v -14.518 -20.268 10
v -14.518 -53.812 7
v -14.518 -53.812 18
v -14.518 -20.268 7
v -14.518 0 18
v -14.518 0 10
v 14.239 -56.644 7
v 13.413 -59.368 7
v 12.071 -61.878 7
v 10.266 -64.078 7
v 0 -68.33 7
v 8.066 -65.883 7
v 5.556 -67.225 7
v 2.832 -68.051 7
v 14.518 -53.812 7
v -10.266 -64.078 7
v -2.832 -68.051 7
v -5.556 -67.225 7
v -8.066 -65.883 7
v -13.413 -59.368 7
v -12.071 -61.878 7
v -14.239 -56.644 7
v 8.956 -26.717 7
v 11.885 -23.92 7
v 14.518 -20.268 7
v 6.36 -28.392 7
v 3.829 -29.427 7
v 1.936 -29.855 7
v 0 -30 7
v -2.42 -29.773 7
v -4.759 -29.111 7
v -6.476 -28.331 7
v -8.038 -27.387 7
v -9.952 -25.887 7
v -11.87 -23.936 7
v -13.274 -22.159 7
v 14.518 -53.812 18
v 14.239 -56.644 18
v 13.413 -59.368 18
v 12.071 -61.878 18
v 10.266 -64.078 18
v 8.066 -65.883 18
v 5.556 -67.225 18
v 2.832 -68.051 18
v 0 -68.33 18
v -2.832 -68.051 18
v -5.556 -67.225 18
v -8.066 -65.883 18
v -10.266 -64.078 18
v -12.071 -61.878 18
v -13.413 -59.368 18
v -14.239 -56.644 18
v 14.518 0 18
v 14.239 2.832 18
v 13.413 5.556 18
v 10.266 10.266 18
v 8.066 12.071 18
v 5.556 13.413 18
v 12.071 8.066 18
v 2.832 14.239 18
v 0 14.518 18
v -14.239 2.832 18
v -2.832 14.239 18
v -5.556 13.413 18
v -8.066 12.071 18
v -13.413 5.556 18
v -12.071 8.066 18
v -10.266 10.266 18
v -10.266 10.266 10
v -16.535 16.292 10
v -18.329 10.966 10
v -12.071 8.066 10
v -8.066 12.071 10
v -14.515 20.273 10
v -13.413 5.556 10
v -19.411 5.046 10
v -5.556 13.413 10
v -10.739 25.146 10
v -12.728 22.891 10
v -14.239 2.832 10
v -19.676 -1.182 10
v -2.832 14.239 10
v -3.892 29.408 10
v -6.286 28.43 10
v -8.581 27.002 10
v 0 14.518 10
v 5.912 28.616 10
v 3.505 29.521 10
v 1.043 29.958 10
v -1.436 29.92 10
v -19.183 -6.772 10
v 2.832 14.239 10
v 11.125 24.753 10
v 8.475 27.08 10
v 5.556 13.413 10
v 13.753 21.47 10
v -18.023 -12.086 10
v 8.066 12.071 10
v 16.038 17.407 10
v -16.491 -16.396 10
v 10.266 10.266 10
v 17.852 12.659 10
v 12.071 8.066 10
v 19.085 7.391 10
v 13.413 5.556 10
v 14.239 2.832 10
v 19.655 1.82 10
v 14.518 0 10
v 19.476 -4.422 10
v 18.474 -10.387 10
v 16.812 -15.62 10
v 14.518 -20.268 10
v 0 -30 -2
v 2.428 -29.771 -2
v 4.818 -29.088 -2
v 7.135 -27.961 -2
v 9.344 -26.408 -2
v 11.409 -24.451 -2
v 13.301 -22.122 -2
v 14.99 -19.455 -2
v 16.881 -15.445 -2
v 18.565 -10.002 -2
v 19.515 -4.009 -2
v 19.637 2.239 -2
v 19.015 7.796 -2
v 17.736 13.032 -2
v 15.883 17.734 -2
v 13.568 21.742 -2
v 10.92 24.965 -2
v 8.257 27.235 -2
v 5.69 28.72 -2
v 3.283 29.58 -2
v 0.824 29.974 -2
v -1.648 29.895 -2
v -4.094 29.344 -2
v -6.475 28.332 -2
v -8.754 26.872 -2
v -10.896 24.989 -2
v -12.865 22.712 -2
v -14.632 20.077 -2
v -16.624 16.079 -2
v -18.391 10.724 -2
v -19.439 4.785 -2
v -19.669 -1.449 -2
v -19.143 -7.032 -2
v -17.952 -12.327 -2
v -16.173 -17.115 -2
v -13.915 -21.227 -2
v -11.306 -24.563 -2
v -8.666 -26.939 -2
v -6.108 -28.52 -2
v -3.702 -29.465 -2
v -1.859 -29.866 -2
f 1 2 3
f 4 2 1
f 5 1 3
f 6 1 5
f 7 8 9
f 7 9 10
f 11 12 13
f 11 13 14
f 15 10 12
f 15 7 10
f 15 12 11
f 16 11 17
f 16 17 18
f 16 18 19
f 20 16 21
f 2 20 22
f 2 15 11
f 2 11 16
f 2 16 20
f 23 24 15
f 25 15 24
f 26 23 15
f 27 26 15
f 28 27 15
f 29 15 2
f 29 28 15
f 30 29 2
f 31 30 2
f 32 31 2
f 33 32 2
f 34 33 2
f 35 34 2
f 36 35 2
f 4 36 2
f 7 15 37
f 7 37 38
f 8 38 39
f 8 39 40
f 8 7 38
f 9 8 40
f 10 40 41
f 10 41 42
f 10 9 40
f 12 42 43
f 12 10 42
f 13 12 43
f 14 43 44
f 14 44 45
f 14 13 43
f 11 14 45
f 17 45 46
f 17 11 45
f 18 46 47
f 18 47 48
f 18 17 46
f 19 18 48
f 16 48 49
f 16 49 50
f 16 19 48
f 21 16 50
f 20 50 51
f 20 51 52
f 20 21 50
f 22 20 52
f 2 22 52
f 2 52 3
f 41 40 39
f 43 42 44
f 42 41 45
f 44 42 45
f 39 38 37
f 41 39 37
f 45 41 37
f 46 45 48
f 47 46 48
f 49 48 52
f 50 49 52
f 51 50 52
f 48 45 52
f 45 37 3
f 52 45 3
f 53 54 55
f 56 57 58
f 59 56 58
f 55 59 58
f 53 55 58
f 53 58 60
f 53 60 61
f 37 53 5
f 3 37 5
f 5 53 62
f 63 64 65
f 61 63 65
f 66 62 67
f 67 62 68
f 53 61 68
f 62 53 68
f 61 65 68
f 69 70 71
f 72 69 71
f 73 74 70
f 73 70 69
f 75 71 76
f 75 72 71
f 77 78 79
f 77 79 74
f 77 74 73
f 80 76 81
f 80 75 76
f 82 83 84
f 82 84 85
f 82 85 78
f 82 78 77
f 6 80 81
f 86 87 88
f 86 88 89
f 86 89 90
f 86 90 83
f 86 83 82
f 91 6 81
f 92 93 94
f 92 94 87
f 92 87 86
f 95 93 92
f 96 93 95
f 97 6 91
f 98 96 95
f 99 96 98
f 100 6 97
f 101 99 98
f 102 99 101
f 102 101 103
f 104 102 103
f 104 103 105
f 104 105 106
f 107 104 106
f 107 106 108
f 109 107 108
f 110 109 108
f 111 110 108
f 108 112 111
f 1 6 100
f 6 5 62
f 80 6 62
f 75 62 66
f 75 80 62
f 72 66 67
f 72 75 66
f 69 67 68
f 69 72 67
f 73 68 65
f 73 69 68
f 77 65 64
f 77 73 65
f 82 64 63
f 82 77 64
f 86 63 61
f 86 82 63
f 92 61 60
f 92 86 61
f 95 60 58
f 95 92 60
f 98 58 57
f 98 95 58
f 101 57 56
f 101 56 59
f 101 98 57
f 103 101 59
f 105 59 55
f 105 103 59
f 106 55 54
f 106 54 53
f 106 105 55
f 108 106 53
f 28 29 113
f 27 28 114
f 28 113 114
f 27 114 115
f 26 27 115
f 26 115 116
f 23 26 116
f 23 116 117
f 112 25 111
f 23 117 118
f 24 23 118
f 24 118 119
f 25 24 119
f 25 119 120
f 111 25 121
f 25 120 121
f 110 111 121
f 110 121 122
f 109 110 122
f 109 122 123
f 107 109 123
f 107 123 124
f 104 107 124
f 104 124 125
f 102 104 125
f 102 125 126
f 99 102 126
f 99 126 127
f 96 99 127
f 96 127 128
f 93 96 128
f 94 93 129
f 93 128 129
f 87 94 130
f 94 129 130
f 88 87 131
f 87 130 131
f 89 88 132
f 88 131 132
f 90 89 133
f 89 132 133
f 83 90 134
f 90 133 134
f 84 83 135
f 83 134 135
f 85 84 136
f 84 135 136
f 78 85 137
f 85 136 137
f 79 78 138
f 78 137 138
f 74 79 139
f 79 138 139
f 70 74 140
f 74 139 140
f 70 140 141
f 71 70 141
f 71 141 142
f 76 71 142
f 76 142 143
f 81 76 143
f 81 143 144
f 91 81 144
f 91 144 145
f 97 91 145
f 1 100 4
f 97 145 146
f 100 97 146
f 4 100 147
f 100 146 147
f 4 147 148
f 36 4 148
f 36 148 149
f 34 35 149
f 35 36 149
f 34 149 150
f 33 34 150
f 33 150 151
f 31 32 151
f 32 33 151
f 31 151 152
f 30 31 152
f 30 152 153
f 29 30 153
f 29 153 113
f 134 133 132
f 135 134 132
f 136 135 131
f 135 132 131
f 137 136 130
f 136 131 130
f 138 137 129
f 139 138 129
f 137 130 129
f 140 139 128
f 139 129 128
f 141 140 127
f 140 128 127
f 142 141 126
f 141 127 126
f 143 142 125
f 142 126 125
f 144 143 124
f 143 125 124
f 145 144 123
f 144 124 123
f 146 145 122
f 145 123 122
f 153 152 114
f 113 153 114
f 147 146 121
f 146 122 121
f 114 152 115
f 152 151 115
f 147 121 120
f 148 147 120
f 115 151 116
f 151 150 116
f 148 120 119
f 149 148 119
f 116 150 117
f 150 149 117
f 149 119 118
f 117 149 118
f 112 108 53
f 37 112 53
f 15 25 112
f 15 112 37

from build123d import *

# Parameters (mm, degrees)
EXTRUDE_1_DEPTH      = 10
EXTRUDE_1_DEPTH_BACK = 2
SKETCH_1_RX          = 30
SKETCH_1_RY          = 19.691511613
EXTRUDE_2_DEPTH      = 8
EXTRUDE_2_DEPTH_BACK = 3


with BuildPart() as part:
    # 草图1 → 凸台-拉伸1 (new, two sides: drawn at the far end of the back side and taken through both)
    with BuildSketch(Plane.XY.offset(-EXTRUDE_1_DEPTH_BACK)):
        with Locations(Location((0, 0), (0, 0, -90))):
            Ellipse(SKETCH_1_RX, SKETCH_1_RY)
    extrude(amount=EXTRUDE_1_DEPTH + EXTRUDE_1_DEPTH_BACK)

    # 草图2 → 凸台-拉伸2 (add, two sides: drawn at the far end of the back side and taken through both)
    with BuildSketch(Plane.XY.offset(10).offset(-EXTRUDE_2_DEPTH_BACK)):
        with BuildLine():
            Line((14.518224671, 0), (14.518224671, -53.811978273))
            ThreePointArc((14.518224671, -53.811978273), (0, -68.330202944), (-14.518224671, -53.811978273))
            Line((-14.518224671, -53.811978273), (-14.518224671, 0))
            ThreePointArc((-14.518224671, 0), (0, 14.518224671), (14.518224671, 0))
        make_face()
    extrude(amount=EXTRUDE_2_DEPTH + EXTRUDE_2_DEPTH_BACK)


solid = part.part
